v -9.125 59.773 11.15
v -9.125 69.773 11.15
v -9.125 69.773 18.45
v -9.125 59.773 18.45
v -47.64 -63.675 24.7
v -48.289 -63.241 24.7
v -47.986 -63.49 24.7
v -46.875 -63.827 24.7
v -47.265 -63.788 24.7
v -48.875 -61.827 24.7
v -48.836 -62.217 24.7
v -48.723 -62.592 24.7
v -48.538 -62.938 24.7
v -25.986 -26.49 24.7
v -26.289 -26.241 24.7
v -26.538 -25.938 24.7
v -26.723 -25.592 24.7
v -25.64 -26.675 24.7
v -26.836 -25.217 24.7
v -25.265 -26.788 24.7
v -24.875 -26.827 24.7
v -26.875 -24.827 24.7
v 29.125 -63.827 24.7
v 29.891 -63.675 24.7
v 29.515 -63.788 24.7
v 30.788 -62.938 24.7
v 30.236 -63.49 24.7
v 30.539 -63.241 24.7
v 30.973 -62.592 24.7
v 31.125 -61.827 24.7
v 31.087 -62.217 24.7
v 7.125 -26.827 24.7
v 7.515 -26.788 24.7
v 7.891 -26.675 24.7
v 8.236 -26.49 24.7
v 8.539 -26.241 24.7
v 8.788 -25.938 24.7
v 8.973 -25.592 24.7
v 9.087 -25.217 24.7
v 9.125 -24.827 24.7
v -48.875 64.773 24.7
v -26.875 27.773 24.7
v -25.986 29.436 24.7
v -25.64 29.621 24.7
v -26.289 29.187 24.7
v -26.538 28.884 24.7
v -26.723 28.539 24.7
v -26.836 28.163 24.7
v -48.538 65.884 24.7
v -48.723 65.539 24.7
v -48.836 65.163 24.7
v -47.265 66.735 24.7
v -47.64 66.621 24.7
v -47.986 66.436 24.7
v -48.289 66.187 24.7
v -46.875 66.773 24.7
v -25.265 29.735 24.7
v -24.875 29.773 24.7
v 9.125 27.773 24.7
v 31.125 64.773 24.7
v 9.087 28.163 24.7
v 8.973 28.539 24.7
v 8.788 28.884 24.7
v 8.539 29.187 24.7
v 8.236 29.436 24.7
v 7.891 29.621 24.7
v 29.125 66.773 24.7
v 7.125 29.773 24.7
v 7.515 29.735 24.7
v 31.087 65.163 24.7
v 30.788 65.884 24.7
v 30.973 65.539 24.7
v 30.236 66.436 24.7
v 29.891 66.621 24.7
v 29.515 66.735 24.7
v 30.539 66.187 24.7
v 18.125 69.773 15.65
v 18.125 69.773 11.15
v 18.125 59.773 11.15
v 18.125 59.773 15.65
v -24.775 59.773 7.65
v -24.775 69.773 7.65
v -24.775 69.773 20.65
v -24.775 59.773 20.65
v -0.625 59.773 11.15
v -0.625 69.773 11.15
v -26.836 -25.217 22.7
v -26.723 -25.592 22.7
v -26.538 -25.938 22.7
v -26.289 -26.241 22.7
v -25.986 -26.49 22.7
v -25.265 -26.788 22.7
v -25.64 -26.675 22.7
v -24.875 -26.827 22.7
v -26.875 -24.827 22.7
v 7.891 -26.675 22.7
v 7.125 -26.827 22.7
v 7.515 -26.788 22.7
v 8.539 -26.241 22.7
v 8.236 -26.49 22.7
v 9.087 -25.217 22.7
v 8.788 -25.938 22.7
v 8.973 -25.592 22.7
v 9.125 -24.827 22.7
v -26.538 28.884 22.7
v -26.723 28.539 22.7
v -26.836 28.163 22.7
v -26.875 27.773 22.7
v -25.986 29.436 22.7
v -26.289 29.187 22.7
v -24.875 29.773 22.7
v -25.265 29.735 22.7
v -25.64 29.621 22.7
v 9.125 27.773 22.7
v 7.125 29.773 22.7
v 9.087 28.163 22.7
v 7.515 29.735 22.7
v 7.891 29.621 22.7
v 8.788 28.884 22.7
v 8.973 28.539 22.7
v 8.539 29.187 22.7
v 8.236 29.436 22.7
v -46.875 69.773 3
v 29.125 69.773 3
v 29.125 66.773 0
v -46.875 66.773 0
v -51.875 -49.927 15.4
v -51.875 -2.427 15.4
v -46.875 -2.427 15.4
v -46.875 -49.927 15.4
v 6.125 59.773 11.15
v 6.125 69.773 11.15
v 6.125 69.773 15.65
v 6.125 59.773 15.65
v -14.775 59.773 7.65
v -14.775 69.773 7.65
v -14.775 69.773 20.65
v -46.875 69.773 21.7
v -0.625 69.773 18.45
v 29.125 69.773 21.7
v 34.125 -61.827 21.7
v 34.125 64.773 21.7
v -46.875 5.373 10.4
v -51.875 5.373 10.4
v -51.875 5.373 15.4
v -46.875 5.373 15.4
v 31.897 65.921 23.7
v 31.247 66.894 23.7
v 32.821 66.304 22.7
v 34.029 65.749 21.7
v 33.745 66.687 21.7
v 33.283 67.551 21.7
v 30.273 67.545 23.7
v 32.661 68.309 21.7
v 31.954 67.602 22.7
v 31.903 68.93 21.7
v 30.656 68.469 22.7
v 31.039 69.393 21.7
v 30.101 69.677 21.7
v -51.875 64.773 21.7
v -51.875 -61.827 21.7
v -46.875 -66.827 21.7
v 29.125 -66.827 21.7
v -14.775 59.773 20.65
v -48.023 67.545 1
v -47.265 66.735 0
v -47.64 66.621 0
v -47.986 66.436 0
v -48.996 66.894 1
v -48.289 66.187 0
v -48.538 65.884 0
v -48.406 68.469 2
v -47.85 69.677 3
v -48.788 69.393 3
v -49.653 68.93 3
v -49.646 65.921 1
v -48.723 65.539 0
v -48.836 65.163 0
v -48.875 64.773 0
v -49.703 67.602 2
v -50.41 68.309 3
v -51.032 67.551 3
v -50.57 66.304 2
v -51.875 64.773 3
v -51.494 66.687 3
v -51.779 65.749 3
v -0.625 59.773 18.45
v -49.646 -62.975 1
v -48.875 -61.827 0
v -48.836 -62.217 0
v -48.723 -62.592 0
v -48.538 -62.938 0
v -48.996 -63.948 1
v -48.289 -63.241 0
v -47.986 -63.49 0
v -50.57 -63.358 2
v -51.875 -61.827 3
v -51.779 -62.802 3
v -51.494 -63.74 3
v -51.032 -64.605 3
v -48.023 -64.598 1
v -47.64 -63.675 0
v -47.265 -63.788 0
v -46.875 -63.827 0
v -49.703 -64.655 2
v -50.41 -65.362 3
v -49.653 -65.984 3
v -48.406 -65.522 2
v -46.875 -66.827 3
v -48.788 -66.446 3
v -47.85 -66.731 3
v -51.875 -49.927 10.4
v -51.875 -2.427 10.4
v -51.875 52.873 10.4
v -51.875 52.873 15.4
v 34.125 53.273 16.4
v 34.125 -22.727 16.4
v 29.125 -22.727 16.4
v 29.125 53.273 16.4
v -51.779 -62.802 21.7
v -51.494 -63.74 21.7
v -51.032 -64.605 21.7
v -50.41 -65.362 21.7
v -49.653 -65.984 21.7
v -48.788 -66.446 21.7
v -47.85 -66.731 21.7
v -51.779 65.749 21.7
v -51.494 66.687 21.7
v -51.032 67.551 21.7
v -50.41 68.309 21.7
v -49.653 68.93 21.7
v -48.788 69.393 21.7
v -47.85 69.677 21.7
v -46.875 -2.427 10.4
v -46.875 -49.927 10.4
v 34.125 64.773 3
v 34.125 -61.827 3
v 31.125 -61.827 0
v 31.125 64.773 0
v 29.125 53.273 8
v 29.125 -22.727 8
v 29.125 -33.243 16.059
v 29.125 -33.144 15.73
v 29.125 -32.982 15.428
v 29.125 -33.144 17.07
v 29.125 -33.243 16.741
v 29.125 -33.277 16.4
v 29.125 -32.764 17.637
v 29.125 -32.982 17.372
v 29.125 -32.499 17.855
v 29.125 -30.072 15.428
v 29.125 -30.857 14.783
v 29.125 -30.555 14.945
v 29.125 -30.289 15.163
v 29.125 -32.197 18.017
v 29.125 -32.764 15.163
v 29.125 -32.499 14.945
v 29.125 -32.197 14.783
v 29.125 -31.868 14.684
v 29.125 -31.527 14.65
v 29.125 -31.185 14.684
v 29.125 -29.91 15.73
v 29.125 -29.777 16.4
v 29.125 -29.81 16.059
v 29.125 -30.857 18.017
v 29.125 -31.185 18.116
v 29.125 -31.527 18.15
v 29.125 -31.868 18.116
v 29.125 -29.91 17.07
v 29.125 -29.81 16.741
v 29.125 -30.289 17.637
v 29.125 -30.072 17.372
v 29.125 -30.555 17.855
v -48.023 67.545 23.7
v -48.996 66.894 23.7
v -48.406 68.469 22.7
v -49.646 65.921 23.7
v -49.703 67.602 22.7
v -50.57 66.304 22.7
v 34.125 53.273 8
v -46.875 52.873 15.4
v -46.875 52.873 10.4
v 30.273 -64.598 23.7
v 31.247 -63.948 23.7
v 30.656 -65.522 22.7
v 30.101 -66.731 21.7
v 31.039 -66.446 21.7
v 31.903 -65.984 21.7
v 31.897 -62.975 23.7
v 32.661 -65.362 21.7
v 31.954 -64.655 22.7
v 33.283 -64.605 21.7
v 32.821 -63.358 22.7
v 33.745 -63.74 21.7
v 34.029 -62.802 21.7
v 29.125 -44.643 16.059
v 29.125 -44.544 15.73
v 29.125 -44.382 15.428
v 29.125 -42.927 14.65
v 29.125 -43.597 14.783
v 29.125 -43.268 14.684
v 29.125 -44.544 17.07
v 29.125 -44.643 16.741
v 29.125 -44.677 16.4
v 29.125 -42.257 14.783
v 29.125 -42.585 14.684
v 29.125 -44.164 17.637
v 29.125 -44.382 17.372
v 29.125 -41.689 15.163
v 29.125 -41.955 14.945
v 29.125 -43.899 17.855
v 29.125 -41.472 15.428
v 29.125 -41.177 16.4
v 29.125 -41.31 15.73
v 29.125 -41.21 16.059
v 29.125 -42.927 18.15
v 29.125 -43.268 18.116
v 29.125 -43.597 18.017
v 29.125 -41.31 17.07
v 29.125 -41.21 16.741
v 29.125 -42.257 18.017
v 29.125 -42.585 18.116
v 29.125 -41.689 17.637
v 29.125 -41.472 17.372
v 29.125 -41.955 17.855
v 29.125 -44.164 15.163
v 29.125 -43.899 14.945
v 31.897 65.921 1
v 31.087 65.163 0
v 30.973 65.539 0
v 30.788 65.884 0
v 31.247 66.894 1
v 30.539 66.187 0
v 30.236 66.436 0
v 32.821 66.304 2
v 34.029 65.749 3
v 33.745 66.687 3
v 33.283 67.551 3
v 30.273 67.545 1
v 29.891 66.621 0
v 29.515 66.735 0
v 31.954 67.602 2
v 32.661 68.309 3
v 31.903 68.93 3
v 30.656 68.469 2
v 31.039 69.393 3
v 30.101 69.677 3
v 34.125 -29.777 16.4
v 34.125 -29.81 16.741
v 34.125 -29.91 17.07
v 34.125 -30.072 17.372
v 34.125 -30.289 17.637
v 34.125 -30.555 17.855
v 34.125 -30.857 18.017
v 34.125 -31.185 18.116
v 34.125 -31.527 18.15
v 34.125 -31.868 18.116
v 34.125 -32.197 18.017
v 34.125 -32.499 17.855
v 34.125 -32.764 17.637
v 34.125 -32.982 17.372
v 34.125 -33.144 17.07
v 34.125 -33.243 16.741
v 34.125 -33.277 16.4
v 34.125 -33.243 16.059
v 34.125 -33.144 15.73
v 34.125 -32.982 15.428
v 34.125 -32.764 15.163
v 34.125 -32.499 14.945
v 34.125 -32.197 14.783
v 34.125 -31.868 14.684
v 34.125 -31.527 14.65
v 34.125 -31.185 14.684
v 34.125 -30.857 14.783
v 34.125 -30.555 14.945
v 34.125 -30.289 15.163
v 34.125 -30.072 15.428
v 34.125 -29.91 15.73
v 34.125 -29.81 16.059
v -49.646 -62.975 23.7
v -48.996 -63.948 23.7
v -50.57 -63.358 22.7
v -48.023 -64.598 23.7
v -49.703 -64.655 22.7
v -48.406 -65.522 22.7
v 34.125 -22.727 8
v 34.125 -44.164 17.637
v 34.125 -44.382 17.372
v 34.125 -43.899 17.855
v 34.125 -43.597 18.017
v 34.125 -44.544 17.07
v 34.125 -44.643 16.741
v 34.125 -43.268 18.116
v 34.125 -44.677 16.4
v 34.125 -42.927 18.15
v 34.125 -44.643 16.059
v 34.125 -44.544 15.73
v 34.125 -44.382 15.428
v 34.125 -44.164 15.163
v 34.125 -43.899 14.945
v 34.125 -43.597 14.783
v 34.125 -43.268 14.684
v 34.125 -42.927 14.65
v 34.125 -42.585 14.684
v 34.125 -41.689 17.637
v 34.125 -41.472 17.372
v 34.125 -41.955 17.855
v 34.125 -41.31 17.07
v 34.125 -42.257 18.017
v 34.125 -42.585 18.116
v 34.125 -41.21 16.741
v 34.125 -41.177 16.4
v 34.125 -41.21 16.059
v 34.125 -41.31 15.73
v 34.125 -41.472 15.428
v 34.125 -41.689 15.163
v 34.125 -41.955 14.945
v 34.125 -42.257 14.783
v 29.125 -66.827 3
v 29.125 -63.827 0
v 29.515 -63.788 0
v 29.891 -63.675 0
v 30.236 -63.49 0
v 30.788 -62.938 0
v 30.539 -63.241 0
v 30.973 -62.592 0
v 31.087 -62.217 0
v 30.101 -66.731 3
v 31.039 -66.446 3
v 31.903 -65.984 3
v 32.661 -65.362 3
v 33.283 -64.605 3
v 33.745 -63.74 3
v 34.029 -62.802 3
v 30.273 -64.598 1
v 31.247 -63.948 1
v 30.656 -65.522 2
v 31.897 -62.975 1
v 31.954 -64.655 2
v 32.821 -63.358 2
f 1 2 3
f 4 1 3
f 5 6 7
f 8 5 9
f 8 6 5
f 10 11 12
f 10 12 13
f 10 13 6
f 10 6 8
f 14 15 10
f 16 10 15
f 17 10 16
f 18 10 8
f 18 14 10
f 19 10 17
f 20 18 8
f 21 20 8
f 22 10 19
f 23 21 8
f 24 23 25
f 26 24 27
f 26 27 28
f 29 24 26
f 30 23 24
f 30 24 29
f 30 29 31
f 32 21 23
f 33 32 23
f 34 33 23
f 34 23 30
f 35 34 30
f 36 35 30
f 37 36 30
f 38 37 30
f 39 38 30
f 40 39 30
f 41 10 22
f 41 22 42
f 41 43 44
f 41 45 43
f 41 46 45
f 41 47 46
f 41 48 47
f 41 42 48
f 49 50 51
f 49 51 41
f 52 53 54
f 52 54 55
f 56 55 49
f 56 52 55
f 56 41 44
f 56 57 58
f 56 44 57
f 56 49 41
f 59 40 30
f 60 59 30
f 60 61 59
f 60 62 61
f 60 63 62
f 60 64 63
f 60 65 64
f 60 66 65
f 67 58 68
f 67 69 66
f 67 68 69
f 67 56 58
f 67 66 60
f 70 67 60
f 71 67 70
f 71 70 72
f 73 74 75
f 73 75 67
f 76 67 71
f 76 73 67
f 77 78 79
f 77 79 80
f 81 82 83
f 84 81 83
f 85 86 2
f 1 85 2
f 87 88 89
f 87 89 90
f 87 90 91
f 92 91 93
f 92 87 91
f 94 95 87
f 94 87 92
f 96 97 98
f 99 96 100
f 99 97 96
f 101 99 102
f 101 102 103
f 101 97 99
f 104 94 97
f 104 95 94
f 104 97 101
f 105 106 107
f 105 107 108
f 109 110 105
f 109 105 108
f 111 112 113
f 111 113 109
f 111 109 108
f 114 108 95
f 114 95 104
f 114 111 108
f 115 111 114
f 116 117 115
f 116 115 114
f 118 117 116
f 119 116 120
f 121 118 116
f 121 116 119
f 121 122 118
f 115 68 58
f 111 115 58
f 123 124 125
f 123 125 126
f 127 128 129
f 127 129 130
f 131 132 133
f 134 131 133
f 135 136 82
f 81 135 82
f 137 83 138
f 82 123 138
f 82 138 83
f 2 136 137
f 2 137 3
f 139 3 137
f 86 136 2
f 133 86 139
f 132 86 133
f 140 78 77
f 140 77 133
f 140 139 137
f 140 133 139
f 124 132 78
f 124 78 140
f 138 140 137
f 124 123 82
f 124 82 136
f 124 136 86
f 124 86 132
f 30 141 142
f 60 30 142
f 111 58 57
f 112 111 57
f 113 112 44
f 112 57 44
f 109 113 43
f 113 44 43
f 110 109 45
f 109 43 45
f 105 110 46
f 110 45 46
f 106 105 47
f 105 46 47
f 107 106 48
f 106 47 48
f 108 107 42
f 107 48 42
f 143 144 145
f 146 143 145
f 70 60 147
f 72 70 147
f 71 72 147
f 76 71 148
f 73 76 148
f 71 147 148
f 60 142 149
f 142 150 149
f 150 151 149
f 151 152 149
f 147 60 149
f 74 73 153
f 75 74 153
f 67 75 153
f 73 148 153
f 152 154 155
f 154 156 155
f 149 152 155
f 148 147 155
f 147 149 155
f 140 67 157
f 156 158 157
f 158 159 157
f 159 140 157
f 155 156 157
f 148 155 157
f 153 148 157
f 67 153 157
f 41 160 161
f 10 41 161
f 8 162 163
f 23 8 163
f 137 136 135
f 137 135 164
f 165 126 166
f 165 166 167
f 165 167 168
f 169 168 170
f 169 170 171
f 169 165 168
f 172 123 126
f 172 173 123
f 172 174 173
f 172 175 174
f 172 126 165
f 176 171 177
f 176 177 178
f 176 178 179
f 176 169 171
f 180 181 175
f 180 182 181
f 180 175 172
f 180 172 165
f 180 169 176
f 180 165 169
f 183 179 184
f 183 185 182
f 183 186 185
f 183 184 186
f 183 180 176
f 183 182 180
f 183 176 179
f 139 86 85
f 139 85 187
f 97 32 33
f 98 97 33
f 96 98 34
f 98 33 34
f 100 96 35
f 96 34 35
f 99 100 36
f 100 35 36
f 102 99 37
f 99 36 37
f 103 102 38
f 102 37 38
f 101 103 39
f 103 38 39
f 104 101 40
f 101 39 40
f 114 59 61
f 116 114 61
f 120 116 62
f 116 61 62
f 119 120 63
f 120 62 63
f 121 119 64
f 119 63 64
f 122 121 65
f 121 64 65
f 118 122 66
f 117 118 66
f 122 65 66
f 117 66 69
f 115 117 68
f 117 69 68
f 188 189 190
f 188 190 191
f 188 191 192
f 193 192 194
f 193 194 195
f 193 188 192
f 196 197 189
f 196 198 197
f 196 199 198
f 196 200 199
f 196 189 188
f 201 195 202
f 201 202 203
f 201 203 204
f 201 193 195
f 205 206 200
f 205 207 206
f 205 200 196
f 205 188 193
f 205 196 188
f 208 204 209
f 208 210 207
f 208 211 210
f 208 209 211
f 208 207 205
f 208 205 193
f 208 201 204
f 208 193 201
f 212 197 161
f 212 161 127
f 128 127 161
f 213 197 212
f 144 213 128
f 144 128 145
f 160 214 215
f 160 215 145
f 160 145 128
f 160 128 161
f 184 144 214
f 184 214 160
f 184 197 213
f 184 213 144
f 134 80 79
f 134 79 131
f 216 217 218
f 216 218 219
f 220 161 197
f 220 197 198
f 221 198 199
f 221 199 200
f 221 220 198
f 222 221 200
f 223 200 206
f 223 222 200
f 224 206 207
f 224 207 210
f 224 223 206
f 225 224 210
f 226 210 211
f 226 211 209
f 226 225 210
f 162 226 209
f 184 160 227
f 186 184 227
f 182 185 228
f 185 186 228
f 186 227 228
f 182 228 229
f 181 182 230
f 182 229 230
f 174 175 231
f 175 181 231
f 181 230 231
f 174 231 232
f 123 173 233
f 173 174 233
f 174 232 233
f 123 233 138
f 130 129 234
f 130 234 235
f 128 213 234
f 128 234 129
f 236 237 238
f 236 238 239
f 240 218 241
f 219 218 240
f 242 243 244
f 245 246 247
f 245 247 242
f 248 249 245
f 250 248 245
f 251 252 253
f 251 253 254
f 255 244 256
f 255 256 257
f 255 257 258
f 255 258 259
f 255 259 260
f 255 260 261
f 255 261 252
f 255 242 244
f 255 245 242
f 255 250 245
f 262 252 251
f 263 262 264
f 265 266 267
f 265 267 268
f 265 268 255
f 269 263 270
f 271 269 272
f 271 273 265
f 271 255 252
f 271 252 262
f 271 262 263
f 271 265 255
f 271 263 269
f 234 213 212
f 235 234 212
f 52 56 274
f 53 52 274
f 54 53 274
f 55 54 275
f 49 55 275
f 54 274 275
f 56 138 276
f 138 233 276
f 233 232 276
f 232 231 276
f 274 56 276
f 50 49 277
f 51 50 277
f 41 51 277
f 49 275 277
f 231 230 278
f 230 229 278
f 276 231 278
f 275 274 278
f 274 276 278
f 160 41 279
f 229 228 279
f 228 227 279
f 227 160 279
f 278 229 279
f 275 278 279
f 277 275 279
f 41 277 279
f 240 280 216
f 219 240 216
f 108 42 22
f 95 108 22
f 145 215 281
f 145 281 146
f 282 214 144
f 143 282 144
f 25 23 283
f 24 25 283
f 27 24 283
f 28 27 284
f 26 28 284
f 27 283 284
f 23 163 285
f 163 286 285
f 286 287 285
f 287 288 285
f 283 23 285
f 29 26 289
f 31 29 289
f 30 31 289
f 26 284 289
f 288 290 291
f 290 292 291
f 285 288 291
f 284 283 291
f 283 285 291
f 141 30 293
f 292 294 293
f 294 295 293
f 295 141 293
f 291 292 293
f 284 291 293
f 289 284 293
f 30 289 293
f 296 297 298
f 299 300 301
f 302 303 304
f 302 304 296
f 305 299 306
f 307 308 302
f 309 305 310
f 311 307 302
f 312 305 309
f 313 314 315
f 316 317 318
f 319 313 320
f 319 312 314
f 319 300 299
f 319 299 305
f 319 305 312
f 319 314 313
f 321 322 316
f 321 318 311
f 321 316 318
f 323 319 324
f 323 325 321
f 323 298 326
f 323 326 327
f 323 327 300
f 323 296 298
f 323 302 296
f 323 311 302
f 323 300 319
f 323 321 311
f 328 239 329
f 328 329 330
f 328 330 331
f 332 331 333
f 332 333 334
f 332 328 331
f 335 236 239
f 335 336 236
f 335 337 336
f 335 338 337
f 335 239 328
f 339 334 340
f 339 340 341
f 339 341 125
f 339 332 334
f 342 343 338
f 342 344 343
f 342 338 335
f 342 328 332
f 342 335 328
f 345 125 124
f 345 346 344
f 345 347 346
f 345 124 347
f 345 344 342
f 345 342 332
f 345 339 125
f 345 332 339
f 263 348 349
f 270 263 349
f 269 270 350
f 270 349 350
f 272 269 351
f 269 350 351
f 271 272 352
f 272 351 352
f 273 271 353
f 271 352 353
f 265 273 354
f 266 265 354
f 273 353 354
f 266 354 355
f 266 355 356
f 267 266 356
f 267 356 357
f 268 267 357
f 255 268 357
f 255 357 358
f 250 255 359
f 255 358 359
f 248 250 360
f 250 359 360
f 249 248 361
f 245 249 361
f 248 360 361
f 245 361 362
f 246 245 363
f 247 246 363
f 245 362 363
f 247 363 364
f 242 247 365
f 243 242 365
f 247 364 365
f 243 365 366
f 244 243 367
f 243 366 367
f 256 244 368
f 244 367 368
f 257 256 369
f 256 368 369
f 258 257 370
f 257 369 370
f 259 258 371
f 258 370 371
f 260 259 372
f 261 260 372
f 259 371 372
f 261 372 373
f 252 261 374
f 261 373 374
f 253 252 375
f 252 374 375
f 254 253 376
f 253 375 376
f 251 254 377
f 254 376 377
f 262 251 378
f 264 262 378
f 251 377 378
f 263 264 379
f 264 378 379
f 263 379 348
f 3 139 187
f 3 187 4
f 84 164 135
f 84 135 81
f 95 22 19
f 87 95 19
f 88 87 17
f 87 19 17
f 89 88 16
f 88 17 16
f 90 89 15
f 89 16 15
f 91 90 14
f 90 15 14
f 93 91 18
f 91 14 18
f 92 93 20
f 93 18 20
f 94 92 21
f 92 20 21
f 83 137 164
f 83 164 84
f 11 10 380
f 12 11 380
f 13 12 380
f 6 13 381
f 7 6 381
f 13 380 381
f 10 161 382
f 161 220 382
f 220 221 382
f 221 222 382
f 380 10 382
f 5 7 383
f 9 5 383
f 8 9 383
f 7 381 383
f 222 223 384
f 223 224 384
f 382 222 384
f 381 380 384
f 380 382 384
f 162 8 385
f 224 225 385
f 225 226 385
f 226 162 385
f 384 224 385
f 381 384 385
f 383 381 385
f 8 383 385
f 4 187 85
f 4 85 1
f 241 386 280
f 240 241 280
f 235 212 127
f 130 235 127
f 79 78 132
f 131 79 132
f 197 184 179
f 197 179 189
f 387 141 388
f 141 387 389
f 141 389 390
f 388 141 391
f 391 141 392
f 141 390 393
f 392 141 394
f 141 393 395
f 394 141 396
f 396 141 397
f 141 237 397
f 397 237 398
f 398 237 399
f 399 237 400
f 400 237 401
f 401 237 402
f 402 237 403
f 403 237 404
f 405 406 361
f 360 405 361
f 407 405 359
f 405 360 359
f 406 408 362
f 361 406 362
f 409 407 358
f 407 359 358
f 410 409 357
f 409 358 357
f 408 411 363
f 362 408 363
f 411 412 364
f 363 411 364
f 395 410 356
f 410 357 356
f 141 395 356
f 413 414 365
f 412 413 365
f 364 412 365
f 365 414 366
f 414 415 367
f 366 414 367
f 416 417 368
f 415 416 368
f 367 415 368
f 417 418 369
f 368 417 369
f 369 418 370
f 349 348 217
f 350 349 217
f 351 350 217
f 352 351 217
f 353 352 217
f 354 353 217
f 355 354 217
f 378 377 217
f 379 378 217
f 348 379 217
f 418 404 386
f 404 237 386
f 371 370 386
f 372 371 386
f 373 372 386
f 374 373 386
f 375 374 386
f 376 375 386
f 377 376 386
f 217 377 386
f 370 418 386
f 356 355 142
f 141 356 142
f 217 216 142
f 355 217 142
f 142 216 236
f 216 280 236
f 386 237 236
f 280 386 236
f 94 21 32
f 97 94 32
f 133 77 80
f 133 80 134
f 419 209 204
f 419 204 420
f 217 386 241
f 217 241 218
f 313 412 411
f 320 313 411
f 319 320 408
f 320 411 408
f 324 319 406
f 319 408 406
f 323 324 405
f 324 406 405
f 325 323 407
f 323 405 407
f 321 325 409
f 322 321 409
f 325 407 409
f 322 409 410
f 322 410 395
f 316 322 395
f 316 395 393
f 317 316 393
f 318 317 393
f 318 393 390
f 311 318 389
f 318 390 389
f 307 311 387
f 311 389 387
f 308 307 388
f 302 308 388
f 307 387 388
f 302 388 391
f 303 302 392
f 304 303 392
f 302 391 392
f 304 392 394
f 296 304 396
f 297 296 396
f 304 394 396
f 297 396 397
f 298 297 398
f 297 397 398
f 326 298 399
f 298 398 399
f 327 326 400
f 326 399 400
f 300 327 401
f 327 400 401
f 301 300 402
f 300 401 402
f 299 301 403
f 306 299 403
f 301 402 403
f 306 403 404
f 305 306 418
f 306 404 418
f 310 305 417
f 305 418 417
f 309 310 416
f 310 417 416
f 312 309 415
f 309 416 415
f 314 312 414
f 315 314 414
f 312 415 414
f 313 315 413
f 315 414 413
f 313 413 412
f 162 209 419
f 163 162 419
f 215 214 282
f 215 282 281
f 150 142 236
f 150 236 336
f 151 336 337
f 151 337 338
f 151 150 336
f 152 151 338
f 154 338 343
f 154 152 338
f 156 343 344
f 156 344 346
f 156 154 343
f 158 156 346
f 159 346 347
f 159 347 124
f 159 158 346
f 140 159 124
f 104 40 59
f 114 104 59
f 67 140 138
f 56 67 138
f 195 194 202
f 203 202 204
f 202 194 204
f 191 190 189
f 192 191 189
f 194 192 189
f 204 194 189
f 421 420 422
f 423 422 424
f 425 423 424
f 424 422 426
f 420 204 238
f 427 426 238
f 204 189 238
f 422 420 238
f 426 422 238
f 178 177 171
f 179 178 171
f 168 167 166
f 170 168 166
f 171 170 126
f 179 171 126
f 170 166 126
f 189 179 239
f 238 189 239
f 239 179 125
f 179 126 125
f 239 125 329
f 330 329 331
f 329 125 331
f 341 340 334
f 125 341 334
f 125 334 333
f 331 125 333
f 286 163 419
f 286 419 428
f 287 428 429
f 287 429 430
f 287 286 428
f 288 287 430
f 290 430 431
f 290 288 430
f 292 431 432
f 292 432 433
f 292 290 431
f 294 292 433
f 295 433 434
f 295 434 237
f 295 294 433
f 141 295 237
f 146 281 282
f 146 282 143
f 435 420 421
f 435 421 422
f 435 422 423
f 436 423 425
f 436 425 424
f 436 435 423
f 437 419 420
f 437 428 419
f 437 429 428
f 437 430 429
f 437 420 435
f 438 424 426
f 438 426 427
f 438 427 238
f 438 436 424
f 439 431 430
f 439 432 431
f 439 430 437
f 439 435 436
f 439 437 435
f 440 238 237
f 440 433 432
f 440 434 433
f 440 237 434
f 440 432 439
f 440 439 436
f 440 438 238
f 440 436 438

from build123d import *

# Parameters (mm, degrees)
F0_W      = 86
F0_H      = 136.6
F1_DEPTH  = 24.7
F3_R      = 5
F4_SIZE   = 3
F6_DEPTH  = 2
F7_W      = 47.5
F7_H      = 5
F8_DEPTH  = 5
F2_W      = 12
F2_H      = 4.5
F2_W_2    = 8.5
F2_H_2    = 7.3
F2_W_3    = 10
F2_H_3    = 13
F9_DEPTH  = 10
F10_W     = 76
F10_H     = 8.4
F10_R     = 1.75
F11_DEPTH = 5


with BuildPart() as f1:
    # F0 (on Top) → F1 (new body)
    with BuildSketch(Plane.XY):
        with Locations((-8.874781, 1.473147)):
            Rectangle(F0_W, F0_H)
    extrude(amount=F1_DEPTH)

    # F3
    f3_edges = [f1.edges().sort_by_distance(p)[0] for p in [
        (-51.874781, -66.826853, 12.35),
        (34.125219, -66.826853, 12.35),
        (34.125219, 69.773147, 12.35),
        (-51.874781, 69.773147, 12.35),
    ]]
    fillet(f3_edges, radius=F3_R)

    # F4
    f4_edges = [f1.edges().sort_by_distance(p)[0] for p in [
        (34.125219, 1.473147, 24.7),
        (32.660753, -65.362386, 24.7),
        (32.660753, 68.308681, 24.7),
        (-8.874781, -66.826853, 24.7),
        (-8.874781, 69.773147, 24.7),
        (-50.410315, -65.362386, 24.7),
        (-50.410315, 68.308681, 24.7),
        (-51.874781, 1.473147, 24.7),
        (34.125219, 1.473147, 0),
        (32.660753, -65.362386, 0),
        (32.660753, 68.308681, 0),
        (-8.874781, -66.826853, 0),
        (-8.874781, 69.773147, 0),
        (-50.410315, -65.362386, 0),
        (-50.410315, 68.308681, 0),
        (-51.874781, 1.473147, 0),
    ]]
    chamfer(f4_edges, length=F4_SIZE)

    # F5 (on face) → F6 (cut)
    with BuildSketch(Plane.XY.offset(24.7)):
        with BuildLine():
            Line((7.125219, 29.773147), (-24.874781, 29.773147))
            ThreePointArc((-24.874781, 29.773147), (-26.288994, 29.187361), (-26.874781, 27.773147))
            Line((-26.874781, 27.773147), (-26.874781, -24.826853))
            ThreePointArc((-26.874781, -24.826853), (-26.288994, -26.241066), (-24.874781, -26.826853))
            Line((-24.874781, -26.826853), (7.125219, -26.826853))
            ThreePointArc((7.125219, -26.826853), (8.539433, -26.241066), (9.125219, -24.826853))
            Line((9.125219, -24.826853), (9.125219, 27.773147))
            ThreePointArc((9.125219, 27.773147), (8.539433, 29.187361), (7.125219, 29.773147))
        make_face()
    extrude(amount=-F6_DEPTH, mode=Mode.SUBTRACT)

    # F7 (on face) → F8 (cut)
    with BuildSketch(Plane(origin=(-51.874781, 0, 0), x_dir=(0, -1, 0), z_dir=(-1, 0, 0))):
        with Locations((-29.123147, 12.9)):
            Rectangle(F7_W, F7_H)
        with Locations((26.176853, 12.9)):
            Rectangle(F7_W, F7_H)
    extrude(amount=-F8_DEPTH, mode=Mode.SUBTRACT)

    # F2 (on face) → F9 (cut)
    with BuildSketch(Plane(origin=(0, 69.773147, 0), x_dir=(-1, 0, 0), z_dir=(0, 1, 0))):
        with Locations((-12.125219, 13.4)):
            Rectangle(F2_W, F2_H)
        with Locations((4.874781, 14.8)):
            Rectangle(F2_W_2, F2_H_2)
        with Locations((19.774781, 14.15)):
            Rectangle(F2_W_3, F2_H_3)
    extrude(amount=-F9_DEPTH, mode=Mode.SUBTRACT)

    # F10 (on face) → F11 (cut)
    with BuildSketch(Plane.YZ.offset(34.125219)):
        with Locations((15.273147, 12.2)):
            Rectangle(F10_W, F10_H)
        with Locations((-42.926853, 16.4)):
            Circle(F10_R)
        with Locations((-31.526853, 16.4)):
            Circle(F10_R)
    extrude(amount=-F11_DEPTH, mode=Mode.SUBTRACT)


solid = f1.part
